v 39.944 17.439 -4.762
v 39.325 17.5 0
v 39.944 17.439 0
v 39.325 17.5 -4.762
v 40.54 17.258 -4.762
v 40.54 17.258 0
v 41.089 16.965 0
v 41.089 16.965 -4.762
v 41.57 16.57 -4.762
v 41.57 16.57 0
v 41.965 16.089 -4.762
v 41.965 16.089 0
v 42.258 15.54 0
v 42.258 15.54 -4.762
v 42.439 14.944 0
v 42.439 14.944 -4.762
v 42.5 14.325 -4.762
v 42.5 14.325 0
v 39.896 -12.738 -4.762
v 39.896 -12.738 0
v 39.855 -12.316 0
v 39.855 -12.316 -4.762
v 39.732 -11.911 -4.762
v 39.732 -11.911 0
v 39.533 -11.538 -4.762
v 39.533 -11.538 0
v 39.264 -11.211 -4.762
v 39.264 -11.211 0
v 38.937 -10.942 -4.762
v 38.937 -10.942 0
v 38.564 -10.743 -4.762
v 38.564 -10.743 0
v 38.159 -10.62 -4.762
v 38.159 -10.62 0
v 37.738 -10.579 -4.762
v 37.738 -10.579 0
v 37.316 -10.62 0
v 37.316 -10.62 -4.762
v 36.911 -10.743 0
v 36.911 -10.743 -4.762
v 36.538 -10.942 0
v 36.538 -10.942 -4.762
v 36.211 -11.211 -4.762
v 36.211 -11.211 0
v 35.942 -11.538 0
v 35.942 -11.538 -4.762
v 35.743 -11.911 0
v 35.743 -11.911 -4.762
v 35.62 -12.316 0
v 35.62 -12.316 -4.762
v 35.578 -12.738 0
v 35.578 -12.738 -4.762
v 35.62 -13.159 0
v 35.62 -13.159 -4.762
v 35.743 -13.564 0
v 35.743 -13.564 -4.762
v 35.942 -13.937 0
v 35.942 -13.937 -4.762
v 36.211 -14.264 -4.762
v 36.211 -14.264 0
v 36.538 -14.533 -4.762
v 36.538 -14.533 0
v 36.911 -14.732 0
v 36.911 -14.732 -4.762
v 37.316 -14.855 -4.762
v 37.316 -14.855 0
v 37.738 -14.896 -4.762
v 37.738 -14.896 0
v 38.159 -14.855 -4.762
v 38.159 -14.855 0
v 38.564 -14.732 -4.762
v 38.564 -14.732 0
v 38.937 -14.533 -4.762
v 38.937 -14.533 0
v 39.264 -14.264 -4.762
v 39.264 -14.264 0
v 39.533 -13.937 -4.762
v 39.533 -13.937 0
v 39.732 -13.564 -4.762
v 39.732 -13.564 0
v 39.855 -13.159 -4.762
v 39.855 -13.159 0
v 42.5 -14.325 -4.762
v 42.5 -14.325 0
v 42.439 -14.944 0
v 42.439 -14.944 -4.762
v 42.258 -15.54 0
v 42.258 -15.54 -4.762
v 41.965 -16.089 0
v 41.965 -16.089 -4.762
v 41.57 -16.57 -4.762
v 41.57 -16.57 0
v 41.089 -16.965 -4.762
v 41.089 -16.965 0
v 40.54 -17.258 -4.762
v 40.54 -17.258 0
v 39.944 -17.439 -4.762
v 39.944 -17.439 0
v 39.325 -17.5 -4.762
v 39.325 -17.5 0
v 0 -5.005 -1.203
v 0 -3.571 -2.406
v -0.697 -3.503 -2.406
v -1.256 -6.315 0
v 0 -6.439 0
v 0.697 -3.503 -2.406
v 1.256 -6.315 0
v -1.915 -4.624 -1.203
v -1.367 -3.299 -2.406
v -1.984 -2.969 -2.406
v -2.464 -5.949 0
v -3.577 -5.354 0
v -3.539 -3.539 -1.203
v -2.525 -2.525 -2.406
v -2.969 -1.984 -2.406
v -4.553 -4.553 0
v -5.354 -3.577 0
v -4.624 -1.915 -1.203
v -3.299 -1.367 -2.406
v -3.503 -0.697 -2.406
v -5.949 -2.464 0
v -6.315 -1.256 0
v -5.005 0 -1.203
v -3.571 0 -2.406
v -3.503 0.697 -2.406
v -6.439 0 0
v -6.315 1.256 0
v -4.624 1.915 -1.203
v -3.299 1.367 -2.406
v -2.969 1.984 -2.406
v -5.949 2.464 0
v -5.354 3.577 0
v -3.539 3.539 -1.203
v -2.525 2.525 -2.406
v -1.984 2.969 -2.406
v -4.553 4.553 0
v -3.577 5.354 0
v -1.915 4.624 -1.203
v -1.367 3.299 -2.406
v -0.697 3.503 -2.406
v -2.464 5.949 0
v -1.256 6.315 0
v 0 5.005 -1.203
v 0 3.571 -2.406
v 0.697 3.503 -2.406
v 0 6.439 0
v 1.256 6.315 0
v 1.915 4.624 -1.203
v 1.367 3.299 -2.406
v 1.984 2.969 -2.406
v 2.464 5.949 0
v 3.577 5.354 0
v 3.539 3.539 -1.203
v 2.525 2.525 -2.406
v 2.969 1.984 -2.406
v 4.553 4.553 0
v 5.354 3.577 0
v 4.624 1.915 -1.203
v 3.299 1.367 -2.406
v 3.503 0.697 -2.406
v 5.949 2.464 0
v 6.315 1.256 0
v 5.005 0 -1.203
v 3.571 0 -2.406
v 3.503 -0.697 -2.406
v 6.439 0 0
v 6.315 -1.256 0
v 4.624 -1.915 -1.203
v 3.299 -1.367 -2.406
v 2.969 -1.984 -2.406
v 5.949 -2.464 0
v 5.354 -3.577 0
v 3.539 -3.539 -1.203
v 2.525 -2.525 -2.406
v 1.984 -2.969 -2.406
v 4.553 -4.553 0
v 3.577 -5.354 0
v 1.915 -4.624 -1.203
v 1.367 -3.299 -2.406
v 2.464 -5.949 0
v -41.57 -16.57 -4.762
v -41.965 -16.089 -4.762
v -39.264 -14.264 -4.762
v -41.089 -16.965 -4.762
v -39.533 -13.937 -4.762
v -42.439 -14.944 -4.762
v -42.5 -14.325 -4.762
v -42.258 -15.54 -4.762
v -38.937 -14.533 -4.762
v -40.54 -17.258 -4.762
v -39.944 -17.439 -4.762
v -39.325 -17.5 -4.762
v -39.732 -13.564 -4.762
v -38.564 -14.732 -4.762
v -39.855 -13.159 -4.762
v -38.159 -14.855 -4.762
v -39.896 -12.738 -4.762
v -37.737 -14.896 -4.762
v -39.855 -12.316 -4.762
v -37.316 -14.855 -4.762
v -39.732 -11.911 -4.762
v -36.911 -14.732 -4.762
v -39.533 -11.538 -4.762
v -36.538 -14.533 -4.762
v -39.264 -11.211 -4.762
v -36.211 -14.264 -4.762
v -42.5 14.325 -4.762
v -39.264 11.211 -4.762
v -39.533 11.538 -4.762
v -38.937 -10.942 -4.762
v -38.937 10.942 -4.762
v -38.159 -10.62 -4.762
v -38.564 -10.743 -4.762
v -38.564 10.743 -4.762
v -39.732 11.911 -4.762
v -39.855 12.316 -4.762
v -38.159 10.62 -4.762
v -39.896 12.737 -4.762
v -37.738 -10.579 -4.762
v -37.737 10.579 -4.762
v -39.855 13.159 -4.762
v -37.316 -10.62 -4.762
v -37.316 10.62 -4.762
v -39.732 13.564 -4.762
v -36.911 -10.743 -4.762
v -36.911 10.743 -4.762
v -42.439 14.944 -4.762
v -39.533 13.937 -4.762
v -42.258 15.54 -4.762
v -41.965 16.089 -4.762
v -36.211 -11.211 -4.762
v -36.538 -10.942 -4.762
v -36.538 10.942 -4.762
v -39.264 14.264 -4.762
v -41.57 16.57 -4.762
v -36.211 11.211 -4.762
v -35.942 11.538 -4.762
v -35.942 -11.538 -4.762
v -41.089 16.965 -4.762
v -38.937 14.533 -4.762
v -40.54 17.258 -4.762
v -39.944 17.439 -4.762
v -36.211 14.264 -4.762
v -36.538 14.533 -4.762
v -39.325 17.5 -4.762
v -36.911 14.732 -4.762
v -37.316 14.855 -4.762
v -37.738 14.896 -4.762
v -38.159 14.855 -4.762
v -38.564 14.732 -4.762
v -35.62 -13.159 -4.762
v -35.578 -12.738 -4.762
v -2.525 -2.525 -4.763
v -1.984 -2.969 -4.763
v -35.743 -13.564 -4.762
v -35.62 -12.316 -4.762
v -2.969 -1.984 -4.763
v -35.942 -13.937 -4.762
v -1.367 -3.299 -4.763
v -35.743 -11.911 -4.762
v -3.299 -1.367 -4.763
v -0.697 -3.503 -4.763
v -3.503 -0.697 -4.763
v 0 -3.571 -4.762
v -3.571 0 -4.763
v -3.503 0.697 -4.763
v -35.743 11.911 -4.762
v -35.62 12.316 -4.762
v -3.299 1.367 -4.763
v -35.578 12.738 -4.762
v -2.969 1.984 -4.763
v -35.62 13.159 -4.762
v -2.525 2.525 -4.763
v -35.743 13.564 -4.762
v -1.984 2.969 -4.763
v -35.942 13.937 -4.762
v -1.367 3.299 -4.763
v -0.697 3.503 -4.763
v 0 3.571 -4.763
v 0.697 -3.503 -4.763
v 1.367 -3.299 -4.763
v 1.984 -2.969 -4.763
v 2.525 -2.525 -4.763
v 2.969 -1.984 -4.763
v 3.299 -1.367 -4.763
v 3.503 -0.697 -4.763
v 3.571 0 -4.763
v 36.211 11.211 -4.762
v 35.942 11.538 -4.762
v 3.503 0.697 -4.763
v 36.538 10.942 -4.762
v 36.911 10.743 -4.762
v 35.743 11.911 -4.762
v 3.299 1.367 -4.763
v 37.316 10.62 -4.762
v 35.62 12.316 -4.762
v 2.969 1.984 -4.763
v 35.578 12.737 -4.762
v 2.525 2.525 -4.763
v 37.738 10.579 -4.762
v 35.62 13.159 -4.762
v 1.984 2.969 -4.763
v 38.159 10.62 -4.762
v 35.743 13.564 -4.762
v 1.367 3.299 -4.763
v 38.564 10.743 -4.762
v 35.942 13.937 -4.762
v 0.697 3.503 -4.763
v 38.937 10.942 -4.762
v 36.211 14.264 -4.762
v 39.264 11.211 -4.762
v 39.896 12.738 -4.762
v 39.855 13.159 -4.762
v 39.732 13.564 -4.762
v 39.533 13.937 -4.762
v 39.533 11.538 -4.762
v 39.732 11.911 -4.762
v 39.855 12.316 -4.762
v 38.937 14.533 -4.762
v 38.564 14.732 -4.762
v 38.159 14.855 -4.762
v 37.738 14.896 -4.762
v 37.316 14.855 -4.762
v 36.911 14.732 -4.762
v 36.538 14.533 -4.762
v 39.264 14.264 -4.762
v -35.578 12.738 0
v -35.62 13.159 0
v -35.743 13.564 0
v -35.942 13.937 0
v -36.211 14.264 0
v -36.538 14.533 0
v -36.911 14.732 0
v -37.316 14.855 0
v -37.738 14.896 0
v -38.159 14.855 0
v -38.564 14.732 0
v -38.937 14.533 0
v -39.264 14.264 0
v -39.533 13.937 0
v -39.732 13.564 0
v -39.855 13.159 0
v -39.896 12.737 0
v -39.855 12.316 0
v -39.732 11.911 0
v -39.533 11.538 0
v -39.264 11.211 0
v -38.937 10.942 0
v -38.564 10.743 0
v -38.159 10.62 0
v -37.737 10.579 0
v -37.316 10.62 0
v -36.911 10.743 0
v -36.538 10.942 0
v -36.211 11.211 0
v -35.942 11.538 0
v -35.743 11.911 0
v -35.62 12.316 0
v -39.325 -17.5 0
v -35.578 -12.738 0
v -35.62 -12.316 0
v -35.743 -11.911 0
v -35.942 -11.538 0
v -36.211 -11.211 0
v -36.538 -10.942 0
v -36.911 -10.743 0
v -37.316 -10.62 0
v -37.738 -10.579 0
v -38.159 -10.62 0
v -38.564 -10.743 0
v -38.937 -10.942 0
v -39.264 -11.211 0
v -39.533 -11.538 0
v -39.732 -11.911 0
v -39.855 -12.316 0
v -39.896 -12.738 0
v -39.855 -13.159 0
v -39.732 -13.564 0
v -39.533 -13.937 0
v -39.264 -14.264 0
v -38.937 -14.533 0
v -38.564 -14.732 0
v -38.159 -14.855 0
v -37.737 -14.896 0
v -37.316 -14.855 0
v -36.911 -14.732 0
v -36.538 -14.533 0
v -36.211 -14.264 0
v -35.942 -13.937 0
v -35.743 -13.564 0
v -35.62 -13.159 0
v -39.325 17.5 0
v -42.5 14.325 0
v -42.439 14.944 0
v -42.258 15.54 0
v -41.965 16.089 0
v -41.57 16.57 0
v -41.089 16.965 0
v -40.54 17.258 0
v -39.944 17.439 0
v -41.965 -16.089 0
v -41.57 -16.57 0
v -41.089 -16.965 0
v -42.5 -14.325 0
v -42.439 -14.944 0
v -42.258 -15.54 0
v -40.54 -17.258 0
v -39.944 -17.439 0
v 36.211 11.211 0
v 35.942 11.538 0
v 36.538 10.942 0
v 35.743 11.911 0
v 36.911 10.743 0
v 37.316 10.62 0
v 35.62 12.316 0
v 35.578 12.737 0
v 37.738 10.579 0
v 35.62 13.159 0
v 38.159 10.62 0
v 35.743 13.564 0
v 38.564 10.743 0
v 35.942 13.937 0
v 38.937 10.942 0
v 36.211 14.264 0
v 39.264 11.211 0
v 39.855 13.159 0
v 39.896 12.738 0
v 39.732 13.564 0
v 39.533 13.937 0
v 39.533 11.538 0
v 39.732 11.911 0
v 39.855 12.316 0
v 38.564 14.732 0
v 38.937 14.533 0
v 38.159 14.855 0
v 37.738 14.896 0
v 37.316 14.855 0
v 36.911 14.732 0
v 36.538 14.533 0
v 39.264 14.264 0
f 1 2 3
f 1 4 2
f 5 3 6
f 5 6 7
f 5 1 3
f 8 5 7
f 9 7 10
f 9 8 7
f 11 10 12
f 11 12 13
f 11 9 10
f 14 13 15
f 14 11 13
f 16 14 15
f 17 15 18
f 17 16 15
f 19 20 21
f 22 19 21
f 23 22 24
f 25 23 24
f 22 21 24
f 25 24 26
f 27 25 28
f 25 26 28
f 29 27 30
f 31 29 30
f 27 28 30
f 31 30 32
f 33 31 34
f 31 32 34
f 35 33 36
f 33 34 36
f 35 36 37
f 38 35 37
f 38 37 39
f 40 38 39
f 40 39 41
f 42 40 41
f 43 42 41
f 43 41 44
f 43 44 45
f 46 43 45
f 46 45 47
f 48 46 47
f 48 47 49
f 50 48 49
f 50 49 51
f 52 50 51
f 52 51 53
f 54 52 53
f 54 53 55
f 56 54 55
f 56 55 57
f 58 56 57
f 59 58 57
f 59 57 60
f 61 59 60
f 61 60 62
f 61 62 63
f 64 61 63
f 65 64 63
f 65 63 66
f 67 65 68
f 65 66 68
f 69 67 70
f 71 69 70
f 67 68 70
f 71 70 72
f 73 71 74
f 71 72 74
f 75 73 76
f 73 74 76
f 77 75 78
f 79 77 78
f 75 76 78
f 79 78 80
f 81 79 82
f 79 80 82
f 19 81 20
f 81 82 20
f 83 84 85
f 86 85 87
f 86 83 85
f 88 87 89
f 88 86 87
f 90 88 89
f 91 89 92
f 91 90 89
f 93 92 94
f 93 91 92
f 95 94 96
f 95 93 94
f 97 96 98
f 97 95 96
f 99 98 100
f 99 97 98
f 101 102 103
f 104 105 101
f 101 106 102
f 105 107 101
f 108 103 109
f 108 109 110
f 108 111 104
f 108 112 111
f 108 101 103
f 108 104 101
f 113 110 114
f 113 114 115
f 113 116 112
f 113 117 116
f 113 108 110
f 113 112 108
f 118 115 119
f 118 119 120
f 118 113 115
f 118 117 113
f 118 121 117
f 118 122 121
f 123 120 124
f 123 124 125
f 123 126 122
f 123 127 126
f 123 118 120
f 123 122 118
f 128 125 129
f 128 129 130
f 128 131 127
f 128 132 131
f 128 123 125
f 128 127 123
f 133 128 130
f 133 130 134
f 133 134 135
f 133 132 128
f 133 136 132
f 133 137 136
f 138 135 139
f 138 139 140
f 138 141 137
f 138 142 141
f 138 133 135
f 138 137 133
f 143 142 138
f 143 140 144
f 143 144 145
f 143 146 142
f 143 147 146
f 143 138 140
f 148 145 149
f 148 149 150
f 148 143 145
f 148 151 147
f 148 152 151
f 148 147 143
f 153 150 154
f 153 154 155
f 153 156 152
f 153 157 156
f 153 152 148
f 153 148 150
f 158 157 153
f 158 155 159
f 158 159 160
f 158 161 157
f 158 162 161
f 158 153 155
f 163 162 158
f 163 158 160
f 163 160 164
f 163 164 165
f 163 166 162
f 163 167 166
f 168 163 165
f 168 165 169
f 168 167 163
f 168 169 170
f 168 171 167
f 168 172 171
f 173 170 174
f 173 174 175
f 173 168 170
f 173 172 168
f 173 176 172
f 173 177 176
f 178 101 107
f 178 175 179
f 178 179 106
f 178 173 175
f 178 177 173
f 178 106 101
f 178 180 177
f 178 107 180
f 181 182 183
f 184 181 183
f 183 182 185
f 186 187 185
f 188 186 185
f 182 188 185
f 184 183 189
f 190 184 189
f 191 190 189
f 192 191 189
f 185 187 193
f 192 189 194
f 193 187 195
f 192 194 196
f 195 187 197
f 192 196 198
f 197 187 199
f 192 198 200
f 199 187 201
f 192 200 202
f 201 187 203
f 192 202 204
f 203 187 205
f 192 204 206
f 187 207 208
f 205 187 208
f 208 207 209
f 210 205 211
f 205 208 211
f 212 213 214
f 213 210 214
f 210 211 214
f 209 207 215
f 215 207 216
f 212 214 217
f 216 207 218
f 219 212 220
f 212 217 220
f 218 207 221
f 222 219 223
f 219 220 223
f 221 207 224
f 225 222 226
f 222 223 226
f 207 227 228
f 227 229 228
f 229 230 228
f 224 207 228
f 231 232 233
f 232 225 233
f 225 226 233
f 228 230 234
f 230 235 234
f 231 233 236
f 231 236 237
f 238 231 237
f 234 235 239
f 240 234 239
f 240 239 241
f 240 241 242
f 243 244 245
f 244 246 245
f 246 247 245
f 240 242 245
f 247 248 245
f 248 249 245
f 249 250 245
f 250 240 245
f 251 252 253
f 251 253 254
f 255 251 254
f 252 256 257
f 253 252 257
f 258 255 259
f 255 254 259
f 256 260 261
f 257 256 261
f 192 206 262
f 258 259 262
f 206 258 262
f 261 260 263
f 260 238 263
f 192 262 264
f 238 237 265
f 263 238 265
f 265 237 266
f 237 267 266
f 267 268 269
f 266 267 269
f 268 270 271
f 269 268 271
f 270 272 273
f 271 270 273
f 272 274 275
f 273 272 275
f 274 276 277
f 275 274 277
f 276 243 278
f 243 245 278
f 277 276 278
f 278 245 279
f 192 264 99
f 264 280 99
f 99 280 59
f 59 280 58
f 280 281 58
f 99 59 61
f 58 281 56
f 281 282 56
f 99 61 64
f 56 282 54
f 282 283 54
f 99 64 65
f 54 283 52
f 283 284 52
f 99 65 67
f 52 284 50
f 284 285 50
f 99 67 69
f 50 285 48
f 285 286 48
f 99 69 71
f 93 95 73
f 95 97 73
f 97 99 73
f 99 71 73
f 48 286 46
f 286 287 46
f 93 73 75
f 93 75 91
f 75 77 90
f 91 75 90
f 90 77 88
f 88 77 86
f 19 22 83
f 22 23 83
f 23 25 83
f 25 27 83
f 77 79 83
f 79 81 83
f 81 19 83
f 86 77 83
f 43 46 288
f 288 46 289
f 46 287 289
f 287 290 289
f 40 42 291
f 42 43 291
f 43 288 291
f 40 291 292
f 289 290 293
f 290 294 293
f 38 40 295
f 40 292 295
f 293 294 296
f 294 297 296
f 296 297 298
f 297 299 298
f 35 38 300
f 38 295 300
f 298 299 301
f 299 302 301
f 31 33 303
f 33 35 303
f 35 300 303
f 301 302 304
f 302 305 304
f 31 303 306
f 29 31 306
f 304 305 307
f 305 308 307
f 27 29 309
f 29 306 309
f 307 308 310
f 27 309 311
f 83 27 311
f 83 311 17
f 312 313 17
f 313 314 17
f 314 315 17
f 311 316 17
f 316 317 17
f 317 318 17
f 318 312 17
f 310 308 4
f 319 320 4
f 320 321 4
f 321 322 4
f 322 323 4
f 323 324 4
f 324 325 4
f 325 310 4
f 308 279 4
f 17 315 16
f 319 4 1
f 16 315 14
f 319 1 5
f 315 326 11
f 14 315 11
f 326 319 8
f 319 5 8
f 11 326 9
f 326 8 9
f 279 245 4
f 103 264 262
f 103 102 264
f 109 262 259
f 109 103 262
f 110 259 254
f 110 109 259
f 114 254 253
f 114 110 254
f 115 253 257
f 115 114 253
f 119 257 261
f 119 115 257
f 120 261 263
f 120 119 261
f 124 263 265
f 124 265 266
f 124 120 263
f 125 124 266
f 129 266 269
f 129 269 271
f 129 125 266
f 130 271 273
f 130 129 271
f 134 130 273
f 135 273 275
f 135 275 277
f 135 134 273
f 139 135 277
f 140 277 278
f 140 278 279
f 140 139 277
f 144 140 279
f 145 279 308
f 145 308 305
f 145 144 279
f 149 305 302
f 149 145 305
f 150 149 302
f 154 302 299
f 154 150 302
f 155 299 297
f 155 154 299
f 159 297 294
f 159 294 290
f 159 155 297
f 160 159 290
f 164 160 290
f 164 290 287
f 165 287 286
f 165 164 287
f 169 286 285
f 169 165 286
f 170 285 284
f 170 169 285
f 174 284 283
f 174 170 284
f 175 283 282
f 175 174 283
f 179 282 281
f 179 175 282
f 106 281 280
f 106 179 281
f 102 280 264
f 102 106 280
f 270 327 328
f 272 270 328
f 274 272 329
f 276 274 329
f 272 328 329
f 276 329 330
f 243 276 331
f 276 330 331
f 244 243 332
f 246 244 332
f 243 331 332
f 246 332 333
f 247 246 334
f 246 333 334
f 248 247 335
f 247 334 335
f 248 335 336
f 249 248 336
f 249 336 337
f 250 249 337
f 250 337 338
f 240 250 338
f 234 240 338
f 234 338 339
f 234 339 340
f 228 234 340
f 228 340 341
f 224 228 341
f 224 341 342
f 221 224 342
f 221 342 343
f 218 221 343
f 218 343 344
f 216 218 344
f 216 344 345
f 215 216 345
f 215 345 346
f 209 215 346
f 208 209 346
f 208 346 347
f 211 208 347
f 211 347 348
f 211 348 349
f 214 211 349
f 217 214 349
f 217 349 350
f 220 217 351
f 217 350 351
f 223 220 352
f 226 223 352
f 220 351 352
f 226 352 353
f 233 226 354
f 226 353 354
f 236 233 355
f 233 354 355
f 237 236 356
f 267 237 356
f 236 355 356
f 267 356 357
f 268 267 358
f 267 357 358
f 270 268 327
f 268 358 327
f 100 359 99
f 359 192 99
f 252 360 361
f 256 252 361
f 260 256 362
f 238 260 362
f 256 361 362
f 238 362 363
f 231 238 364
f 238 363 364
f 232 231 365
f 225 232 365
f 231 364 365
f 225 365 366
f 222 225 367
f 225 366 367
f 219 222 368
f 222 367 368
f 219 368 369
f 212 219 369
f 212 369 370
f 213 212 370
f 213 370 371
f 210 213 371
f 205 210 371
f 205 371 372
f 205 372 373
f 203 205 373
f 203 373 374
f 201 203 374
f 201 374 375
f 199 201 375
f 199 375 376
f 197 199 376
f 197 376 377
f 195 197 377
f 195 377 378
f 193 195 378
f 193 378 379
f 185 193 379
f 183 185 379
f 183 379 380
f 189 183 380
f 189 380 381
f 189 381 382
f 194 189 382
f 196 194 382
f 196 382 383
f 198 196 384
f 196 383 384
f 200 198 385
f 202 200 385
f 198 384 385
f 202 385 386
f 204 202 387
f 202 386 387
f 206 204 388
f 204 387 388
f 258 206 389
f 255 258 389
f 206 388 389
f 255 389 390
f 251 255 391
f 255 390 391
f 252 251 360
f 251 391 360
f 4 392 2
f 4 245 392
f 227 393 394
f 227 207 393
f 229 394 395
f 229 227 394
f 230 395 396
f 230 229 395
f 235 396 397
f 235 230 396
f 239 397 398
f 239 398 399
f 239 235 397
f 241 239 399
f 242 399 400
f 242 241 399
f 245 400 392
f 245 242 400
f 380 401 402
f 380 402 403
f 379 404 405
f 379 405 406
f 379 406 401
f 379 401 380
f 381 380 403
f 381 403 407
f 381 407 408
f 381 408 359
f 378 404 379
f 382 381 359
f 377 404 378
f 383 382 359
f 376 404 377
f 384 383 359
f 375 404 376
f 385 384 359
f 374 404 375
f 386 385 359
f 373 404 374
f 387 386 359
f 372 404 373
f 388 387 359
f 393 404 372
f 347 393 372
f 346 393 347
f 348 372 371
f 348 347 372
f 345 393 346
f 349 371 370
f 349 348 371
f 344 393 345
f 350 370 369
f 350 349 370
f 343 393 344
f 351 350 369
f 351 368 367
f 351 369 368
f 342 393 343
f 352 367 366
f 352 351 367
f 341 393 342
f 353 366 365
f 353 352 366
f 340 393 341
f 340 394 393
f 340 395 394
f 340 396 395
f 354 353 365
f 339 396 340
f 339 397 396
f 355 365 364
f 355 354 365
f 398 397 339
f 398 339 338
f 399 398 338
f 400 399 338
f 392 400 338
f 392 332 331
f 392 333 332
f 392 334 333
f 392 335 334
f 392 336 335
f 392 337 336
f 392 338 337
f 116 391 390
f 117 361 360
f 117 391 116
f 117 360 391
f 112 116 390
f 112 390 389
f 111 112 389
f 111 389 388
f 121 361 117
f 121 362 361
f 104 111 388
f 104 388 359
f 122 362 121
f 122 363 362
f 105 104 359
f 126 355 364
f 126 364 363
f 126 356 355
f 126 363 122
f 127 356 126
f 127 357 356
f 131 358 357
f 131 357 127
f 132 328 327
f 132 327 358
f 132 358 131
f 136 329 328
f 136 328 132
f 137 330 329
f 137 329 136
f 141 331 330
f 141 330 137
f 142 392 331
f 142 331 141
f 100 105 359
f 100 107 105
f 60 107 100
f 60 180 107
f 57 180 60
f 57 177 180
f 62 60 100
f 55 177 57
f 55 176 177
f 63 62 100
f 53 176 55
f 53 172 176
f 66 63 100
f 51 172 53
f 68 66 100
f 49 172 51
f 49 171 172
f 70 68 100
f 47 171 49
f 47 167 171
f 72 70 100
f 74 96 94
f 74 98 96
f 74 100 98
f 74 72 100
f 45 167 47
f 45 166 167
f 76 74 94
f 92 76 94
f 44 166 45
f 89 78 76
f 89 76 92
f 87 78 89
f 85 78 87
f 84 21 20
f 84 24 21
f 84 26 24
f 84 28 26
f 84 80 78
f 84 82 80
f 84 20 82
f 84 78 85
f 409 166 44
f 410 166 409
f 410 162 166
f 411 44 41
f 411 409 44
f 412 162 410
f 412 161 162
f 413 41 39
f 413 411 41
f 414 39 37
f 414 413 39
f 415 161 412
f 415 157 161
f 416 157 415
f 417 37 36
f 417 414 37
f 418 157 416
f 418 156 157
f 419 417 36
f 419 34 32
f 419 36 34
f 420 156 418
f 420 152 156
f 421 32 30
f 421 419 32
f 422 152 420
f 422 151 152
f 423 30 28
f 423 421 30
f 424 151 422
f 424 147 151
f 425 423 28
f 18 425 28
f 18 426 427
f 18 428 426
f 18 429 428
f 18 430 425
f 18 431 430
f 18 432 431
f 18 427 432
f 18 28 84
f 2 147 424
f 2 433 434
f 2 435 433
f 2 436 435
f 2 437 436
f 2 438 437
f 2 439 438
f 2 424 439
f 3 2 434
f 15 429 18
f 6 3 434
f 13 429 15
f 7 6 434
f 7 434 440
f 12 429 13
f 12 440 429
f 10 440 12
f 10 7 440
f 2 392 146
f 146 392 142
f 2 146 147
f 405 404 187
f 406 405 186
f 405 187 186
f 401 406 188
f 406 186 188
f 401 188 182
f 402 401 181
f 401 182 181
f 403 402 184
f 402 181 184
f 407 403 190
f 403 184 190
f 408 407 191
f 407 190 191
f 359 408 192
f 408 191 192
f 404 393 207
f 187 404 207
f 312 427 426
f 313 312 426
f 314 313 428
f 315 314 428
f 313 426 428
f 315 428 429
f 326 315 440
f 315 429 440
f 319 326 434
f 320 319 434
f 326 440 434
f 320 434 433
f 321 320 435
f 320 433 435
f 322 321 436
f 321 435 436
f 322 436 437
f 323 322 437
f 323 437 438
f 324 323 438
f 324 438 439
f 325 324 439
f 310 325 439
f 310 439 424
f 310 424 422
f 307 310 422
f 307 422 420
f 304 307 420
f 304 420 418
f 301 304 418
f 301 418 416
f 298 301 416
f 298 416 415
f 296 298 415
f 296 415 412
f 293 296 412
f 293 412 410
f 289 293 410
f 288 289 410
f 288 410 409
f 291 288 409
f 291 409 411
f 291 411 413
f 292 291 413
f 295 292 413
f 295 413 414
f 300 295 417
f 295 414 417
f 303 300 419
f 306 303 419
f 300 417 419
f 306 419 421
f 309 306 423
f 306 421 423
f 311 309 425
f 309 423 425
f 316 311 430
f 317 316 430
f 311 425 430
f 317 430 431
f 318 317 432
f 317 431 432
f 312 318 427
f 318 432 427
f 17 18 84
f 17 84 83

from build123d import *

# Parameters (mm, degrees)
SKETCH1_W           = 85
SKETCH1_H           = 4.7625
BOSS_EXTRUDE1_DEPTH = 17.5
FILLET1_R           = 3.175
SKETCH3_R           = 2.159
CUT_EXTRUDE3_DEPTH  = 10


with BuildPart() as part:
    # Sketch1 → Boss-Extrude1 (new, symmetric)
    with BuildSketch(Plane(origin=(0, 0, 0), x_dir=(1, 0, 0), z_dir=(0, 1, 0))):
        with Locations((0, 2.38125)):
            Rectangle(SKETCH1_W, SKETCH1_H)
    extrude(amount=BOSS_EXTRUDE1_DEPTH, both=True)

    # Fillet1
    fillet1_edges = [part.edges().sort_by_distance(p)[0] for p in [
        (42.5, 17.5, -2.38125),
        (42.5, -17.5, -2.38125),
        (-42.5, -17.5, -2.38125),
        (-42.5, 17.5, -2.38125),
    ]]
    fillet(fillet1_edges, radius=FILLET1_R)

    # Sketch3 → Cut-Extrude3 (cut)
    with BuildSketch(Plane.XY):
        with Locations((-37.7375, 12.7375)):
            Circle(SKETCH3_R)
        with Locations((-37.7375, -12.7375)):
            Circle(SKETCH3_R)
        with Locations((37.7375, 12.7375)):
            Circle(SKETCH3_R)
        with Locations((37.7375, -12.7375)):
            Circle(SKETCH3_R)
    extrude(amount=-CUT_EXTRUDE3_DEPTH, mode=Mode.SUBTRACT)

    # Sketch9 → CSK for 1/4 Flat Head Machine Screw (100)1 (revolve, cut)
    with BuildSketch(Plane(origin=(0, 0, 0), x_dir=(0, -1, 0), z_dir=(1, 0, 0))):
        Polygon((0, 0), (0, 4.7625), (3.57124, 4.7625), (3.57124, 2.406252448), (6.4389, 0), align=None)
    revolve(axis=Axis((0, 0, 6.35), (0, 0, -1)), mode=Mode.SUBTRACT)


solid = part.part
